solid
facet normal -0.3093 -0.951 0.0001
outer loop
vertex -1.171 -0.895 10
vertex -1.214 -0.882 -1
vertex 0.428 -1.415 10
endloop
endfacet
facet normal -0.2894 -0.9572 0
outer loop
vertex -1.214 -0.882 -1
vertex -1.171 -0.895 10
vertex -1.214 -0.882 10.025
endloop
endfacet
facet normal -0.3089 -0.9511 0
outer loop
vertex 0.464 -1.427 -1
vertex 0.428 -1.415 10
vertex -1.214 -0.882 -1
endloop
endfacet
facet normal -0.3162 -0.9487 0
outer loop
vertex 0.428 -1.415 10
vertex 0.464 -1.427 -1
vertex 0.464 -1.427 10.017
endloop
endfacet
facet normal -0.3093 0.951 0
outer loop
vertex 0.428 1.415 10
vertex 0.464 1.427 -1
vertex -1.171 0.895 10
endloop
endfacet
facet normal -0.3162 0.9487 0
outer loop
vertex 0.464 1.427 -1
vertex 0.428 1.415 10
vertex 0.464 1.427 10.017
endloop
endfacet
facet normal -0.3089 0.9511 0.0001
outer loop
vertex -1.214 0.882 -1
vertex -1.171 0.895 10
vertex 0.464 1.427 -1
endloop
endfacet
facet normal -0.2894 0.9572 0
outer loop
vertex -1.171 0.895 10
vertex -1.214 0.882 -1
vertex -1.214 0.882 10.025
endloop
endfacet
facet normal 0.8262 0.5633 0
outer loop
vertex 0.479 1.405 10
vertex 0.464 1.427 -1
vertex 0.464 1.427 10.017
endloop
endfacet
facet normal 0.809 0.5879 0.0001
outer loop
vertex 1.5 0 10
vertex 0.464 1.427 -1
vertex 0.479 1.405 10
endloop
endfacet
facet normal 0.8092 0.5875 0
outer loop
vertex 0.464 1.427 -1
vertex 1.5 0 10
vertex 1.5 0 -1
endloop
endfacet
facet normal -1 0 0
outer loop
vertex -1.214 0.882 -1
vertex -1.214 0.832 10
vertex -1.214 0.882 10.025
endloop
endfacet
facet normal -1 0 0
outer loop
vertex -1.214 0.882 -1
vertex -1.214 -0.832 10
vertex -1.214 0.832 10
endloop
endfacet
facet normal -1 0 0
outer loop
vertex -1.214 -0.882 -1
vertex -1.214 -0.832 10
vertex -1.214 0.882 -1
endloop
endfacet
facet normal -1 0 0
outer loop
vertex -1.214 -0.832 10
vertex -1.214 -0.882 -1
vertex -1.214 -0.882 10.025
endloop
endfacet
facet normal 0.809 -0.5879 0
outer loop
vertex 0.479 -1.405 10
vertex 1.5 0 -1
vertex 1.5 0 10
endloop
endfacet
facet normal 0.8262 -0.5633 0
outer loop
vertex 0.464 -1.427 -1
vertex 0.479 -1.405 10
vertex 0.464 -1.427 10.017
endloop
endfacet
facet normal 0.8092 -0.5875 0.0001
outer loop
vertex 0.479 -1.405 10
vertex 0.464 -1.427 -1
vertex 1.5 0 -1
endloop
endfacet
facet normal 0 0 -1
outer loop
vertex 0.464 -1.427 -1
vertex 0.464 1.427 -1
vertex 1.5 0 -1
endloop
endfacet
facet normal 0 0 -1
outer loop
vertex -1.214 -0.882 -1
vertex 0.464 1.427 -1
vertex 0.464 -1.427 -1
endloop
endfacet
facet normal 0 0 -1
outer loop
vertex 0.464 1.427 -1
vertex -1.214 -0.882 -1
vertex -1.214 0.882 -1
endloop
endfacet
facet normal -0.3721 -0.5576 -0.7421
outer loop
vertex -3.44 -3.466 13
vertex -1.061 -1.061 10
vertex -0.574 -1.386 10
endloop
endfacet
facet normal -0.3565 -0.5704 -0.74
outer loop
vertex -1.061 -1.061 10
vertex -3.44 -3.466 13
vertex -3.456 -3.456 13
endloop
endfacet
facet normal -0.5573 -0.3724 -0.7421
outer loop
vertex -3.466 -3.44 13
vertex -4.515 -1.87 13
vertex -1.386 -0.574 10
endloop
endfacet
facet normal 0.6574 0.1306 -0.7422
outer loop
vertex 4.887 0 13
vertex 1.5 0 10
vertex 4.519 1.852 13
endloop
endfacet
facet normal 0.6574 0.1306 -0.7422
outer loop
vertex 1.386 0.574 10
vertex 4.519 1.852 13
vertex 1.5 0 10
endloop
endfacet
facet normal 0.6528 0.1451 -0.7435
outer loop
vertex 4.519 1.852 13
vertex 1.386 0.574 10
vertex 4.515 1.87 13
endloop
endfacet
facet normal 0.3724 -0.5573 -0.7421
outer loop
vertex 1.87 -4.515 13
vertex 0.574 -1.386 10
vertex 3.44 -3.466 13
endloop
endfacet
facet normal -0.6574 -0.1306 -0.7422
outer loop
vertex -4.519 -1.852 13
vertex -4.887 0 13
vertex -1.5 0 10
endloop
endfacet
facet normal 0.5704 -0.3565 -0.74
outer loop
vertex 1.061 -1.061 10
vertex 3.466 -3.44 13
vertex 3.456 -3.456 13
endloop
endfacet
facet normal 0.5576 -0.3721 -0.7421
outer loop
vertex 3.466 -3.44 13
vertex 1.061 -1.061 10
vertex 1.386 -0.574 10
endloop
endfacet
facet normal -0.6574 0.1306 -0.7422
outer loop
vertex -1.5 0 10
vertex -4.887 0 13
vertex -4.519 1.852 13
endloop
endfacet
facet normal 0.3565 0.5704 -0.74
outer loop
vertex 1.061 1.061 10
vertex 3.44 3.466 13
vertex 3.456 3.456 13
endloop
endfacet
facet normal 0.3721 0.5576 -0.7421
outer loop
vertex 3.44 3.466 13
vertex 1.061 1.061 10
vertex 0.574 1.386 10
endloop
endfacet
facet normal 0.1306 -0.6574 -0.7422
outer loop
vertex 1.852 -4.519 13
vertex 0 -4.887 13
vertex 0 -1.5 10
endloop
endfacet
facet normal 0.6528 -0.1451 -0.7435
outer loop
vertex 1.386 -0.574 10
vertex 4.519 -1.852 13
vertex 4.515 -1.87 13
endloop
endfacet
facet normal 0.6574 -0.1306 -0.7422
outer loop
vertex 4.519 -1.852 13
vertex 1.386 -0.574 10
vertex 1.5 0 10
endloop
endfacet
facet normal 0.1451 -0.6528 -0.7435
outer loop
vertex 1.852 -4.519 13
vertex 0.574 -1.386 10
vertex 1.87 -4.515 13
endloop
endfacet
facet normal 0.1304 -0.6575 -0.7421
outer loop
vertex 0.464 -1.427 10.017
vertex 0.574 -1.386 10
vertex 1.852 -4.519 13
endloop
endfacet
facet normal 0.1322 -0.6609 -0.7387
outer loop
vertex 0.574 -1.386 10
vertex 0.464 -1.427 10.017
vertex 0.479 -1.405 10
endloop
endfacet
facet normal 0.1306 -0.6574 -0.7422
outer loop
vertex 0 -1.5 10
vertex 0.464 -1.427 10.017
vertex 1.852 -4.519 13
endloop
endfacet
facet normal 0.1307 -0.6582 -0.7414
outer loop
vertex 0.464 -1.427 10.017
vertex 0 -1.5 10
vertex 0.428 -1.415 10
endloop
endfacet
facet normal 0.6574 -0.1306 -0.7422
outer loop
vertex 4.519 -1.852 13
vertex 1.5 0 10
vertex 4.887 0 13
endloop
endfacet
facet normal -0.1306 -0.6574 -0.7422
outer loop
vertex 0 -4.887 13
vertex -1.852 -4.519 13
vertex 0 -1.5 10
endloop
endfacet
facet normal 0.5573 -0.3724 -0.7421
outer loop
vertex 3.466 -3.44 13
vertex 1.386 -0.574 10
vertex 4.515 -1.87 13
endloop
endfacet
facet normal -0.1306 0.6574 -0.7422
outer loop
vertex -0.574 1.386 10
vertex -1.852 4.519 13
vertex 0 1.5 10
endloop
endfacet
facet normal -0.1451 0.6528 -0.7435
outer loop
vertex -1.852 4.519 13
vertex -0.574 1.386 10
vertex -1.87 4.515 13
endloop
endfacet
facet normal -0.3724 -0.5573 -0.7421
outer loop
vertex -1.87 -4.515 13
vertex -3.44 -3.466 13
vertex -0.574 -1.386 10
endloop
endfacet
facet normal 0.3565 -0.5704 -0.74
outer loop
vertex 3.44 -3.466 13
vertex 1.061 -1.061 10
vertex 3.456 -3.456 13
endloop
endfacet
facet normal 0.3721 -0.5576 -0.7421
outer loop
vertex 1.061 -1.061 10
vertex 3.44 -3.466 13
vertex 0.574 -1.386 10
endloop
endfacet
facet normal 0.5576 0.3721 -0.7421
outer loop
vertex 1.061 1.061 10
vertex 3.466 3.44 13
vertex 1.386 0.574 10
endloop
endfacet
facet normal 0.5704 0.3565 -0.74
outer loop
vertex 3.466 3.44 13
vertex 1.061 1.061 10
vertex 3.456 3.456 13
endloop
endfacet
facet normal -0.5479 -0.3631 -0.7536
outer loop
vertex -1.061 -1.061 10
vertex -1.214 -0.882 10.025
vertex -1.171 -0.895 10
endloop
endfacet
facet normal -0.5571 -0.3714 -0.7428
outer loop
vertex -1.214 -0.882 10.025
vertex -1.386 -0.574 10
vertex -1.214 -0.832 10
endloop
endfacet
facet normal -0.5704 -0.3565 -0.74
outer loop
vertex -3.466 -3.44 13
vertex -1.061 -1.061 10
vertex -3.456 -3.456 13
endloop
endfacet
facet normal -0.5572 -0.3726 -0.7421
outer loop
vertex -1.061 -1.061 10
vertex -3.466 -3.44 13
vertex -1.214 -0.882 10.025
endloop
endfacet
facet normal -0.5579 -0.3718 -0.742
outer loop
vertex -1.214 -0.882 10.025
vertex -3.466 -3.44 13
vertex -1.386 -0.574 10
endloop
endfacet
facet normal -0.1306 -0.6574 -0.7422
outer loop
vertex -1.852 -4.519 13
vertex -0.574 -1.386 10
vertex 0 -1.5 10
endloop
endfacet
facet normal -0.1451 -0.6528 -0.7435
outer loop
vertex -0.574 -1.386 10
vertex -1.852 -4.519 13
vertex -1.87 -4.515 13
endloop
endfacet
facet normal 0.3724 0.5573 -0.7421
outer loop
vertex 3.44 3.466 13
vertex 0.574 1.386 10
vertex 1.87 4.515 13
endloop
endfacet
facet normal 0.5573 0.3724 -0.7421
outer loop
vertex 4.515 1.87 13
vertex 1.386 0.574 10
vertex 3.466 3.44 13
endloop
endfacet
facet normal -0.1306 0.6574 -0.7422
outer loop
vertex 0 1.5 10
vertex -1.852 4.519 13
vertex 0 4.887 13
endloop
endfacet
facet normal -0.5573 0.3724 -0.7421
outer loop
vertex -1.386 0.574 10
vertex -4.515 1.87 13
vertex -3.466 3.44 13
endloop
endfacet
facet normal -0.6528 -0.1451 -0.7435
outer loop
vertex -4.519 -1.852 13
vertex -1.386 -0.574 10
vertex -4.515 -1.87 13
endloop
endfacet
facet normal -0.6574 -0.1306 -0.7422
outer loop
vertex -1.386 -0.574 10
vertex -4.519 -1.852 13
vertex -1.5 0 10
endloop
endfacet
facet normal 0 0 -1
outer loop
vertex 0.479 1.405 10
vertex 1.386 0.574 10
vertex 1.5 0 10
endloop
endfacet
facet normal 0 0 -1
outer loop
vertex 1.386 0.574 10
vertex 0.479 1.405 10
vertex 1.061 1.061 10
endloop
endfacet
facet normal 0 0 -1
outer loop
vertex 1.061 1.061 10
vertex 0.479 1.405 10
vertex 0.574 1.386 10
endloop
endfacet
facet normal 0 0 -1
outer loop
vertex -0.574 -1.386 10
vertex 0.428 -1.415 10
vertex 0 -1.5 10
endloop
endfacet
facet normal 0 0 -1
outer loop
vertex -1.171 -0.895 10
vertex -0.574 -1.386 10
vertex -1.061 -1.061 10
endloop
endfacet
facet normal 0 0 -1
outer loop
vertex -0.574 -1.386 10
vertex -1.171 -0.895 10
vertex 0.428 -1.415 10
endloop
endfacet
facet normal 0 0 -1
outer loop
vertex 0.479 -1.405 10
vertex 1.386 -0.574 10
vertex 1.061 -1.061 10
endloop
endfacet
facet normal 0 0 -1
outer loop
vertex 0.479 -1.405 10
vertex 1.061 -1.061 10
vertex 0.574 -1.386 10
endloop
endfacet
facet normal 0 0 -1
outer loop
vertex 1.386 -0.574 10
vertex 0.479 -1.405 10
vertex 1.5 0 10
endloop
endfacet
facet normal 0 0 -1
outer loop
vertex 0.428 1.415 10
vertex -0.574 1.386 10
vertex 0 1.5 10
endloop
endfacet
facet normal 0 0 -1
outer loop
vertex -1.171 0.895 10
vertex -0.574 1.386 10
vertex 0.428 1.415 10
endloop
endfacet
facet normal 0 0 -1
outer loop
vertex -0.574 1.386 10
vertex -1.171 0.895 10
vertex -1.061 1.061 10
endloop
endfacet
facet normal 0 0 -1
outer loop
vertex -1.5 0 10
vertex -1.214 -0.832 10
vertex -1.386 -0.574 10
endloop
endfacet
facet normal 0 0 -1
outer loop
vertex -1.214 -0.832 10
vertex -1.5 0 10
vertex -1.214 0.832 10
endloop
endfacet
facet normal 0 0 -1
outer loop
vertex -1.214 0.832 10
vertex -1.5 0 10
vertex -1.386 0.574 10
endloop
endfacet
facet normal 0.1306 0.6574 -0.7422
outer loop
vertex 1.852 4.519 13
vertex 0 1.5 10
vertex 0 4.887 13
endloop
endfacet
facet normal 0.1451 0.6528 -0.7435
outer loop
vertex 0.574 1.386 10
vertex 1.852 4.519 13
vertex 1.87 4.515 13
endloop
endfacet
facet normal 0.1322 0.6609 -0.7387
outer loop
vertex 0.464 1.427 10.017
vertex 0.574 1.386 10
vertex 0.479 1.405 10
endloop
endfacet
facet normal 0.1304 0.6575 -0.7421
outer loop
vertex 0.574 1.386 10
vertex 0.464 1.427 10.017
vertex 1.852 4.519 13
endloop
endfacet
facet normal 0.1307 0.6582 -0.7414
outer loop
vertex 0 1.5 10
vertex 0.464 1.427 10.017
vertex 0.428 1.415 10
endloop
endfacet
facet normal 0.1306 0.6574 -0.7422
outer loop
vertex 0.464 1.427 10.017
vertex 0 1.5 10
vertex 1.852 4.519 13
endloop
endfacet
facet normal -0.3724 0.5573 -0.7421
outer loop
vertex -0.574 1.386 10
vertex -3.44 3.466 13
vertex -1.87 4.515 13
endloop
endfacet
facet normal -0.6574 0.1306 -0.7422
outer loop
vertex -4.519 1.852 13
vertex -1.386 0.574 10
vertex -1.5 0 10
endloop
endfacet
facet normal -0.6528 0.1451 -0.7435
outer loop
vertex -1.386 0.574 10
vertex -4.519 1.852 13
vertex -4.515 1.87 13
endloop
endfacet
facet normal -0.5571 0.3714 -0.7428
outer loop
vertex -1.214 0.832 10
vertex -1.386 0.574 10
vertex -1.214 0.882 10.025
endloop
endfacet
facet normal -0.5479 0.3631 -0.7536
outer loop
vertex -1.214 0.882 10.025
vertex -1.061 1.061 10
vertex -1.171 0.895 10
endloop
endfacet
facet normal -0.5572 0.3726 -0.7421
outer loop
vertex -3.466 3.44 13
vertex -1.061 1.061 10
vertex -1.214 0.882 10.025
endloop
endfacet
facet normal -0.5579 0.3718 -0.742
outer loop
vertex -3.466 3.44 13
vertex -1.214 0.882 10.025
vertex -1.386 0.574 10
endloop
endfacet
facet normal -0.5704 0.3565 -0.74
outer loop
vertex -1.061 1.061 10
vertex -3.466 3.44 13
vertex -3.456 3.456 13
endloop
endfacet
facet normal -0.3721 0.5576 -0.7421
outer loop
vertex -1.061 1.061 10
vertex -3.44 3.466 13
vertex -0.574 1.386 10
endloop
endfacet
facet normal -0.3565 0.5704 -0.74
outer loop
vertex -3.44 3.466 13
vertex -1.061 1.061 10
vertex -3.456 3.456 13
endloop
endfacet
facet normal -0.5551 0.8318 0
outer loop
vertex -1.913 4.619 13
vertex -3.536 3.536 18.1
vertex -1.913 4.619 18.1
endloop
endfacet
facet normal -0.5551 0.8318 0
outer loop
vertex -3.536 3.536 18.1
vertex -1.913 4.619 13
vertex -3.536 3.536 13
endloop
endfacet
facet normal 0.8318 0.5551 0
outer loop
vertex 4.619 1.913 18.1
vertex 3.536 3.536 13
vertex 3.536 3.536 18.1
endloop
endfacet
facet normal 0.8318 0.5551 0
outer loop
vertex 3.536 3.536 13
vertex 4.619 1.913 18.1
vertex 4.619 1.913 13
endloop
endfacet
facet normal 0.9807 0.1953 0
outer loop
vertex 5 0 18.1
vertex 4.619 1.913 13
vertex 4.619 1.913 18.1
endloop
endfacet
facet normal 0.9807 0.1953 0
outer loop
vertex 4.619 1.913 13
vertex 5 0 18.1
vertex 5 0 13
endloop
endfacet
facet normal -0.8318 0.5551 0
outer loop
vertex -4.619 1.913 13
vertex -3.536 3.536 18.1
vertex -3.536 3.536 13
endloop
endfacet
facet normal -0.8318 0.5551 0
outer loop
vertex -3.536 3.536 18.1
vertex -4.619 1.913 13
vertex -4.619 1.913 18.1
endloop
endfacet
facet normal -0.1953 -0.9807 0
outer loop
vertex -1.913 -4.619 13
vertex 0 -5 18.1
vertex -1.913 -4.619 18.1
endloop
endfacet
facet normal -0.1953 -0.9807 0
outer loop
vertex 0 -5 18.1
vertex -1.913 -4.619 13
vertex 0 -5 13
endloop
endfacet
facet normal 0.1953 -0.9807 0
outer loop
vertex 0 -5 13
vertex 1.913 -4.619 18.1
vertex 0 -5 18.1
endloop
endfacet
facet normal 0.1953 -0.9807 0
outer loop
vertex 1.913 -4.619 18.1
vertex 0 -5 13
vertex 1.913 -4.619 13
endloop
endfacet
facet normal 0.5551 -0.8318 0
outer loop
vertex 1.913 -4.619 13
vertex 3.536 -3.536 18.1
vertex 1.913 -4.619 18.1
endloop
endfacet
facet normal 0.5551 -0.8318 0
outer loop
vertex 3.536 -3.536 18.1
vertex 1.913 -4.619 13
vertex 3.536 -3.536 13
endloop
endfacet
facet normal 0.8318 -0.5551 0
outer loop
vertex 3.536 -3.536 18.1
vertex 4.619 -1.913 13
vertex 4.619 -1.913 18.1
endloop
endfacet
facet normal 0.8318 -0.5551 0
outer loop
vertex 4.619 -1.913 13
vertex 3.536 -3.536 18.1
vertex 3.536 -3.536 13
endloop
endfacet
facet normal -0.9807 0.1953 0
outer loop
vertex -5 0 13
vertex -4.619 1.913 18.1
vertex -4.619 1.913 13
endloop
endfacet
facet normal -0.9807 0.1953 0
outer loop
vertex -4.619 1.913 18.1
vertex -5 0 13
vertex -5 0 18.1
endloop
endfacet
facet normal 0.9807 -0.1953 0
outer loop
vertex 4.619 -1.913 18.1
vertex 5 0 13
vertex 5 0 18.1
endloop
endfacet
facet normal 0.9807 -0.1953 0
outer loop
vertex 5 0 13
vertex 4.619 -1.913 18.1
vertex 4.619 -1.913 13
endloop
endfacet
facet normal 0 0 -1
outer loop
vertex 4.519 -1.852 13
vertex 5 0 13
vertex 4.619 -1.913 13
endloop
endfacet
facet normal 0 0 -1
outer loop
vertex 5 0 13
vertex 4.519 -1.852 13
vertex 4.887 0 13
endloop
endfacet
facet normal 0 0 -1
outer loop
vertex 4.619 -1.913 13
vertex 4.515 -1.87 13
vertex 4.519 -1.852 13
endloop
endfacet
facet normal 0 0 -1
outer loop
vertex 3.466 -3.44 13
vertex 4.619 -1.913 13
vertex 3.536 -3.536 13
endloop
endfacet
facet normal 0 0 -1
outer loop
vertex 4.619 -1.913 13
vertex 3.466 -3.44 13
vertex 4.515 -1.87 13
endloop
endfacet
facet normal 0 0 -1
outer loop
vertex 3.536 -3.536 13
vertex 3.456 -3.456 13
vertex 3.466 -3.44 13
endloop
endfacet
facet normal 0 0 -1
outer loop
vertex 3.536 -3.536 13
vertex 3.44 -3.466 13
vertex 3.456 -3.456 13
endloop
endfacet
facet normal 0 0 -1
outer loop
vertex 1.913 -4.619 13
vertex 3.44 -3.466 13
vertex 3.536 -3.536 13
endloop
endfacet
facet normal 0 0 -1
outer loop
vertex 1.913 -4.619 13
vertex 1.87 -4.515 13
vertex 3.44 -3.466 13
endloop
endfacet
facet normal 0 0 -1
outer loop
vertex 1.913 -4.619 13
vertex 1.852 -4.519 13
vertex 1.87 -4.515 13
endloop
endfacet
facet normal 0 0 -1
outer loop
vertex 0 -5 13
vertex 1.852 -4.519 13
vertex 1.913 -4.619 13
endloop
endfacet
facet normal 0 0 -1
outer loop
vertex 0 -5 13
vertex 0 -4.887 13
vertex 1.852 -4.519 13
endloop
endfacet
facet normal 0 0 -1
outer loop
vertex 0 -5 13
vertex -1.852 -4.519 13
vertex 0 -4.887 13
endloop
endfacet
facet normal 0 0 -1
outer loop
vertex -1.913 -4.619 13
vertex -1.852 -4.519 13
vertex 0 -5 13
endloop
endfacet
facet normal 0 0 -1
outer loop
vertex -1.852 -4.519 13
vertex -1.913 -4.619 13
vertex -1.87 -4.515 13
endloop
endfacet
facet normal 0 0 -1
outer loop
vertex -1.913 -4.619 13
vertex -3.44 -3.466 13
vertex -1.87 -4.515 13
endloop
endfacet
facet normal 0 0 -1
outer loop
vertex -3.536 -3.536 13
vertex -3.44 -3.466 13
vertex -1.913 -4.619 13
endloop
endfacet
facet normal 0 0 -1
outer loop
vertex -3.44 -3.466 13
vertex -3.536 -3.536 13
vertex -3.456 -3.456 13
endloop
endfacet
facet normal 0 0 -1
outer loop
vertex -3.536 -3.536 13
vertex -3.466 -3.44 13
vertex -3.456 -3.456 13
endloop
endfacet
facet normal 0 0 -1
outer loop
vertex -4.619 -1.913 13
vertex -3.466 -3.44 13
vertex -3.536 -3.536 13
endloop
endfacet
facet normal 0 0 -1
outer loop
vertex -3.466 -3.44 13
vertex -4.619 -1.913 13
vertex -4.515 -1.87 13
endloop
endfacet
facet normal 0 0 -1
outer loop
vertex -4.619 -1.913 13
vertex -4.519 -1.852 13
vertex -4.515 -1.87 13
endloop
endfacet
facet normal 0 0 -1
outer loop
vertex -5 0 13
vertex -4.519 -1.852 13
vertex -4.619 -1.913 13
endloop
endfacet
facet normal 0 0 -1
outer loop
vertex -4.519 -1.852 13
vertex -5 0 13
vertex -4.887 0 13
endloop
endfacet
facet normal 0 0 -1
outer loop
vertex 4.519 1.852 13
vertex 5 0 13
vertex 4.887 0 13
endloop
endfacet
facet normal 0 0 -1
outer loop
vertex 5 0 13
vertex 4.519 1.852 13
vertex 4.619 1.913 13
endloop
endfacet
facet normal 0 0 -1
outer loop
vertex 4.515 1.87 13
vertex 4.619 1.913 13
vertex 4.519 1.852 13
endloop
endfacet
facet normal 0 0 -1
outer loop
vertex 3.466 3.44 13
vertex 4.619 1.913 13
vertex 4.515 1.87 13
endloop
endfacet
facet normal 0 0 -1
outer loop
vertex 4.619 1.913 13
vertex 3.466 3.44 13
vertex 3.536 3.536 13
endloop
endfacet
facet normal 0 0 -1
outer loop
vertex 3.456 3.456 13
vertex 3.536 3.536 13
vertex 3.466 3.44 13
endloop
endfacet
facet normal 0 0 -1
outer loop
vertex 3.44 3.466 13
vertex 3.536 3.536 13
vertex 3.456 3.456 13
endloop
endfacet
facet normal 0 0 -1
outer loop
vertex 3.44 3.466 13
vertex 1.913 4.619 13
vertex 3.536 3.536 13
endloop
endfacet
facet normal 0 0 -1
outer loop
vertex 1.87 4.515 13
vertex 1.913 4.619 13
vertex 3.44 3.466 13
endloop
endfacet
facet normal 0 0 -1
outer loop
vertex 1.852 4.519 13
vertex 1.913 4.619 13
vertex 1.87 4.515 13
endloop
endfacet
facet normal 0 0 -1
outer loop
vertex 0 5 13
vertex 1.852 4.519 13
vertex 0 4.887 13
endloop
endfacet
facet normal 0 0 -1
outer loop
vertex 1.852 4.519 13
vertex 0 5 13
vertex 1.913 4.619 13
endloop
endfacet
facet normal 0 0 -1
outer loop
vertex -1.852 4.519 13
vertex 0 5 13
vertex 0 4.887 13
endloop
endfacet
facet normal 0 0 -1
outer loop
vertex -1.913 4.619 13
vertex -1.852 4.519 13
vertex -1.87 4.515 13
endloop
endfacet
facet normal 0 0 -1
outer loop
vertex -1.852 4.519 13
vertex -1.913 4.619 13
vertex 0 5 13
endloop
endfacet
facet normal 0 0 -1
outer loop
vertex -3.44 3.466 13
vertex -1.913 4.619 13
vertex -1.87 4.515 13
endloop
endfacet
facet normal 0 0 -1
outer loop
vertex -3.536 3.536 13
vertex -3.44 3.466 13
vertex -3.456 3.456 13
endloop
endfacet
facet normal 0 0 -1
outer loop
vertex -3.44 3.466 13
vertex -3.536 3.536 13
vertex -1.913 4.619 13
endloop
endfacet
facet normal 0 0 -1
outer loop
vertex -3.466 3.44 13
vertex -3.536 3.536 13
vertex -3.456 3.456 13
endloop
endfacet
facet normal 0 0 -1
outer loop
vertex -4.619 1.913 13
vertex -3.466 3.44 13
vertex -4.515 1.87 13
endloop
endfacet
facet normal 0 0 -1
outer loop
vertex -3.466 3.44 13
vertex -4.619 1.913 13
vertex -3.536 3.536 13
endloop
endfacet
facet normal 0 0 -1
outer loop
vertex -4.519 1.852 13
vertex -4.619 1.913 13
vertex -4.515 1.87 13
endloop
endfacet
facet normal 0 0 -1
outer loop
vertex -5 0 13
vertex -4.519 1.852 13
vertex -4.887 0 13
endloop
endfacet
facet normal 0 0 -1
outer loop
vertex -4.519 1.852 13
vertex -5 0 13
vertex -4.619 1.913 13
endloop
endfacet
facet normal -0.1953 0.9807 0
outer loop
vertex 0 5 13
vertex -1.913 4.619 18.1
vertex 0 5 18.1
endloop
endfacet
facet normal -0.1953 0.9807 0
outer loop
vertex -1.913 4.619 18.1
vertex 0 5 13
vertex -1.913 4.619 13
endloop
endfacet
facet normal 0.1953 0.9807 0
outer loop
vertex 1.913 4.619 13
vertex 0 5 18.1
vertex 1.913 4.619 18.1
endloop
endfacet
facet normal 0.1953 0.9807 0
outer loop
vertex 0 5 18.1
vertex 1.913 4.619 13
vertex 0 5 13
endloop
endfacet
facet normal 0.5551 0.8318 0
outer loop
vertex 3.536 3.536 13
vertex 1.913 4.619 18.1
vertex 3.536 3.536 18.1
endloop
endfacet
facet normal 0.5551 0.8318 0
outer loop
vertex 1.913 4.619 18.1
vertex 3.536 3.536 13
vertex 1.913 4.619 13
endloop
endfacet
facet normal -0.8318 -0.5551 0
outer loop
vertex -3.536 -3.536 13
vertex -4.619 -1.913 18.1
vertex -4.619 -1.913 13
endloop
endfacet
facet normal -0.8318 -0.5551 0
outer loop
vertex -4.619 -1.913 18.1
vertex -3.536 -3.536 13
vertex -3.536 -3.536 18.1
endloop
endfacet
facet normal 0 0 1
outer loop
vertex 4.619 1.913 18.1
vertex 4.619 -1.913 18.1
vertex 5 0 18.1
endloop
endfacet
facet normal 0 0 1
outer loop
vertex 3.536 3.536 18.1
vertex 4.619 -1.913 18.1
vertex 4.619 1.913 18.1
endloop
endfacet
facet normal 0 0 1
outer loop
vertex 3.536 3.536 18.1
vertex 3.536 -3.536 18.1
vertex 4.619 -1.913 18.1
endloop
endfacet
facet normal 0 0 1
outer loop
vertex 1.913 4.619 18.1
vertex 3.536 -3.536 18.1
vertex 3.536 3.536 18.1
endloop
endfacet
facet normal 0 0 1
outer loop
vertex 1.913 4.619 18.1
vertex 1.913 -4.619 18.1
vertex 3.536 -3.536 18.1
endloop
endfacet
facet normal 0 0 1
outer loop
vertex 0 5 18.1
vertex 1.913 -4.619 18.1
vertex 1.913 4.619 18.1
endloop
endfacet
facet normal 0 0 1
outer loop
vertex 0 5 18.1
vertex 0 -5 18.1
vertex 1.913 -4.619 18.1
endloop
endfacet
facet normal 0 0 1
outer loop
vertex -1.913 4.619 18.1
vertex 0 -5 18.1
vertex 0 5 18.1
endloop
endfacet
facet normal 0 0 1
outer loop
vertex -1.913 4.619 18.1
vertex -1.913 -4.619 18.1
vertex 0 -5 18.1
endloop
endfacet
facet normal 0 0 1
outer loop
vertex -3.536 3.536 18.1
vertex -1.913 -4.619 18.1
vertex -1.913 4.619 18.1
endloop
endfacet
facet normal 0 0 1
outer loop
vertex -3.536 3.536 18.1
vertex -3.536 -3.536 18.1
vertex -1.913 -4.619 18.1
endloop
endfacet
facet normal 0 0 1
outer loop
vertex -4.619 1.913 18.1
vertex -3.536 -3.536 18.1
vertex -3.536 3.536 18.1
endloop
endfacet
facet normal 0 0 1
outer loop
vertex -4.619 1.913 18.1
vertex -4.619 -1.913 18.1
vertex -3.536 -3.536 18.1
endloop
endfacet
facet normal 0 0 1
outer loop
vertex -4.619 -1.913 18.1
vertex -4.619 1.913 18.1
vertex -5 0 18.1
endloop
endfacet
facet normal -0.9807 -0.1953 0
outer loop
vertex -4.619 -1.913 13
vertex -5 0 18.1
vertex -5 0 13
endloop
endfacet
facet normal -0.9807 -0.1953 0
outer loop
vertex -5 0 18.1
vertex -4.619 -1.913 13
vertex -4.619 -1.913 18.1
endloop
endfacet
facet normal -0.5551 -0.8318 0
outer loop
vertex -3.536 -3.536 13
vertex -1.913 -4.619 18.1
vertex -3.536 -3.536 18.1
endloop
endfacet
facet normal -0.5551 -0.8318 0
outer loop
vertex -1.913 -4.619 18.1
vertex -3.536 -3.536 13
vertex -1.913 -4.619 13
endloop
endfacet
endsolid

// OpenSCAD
// holes

module tapped_hole(r1, r2, h1, h2, h3=5) {
   // make some kind of a funnell
	// for use with screws
	// it is on purpose a little bit bigger than advertised. it is used for subtraction

	translate([0, 0, -1])
	cylinder(r=r1, h=h1+2);
	translate([0, 0, h1])
	cylinder(r1=r1, r2=r2, h=h2+0.1);
	translate([0, 0, h1+h2])
	cylinder(r=r2, h=h3+0.1);
}

tapped_hole(r1=1.5, r2=5, h1=10, h2=3);
